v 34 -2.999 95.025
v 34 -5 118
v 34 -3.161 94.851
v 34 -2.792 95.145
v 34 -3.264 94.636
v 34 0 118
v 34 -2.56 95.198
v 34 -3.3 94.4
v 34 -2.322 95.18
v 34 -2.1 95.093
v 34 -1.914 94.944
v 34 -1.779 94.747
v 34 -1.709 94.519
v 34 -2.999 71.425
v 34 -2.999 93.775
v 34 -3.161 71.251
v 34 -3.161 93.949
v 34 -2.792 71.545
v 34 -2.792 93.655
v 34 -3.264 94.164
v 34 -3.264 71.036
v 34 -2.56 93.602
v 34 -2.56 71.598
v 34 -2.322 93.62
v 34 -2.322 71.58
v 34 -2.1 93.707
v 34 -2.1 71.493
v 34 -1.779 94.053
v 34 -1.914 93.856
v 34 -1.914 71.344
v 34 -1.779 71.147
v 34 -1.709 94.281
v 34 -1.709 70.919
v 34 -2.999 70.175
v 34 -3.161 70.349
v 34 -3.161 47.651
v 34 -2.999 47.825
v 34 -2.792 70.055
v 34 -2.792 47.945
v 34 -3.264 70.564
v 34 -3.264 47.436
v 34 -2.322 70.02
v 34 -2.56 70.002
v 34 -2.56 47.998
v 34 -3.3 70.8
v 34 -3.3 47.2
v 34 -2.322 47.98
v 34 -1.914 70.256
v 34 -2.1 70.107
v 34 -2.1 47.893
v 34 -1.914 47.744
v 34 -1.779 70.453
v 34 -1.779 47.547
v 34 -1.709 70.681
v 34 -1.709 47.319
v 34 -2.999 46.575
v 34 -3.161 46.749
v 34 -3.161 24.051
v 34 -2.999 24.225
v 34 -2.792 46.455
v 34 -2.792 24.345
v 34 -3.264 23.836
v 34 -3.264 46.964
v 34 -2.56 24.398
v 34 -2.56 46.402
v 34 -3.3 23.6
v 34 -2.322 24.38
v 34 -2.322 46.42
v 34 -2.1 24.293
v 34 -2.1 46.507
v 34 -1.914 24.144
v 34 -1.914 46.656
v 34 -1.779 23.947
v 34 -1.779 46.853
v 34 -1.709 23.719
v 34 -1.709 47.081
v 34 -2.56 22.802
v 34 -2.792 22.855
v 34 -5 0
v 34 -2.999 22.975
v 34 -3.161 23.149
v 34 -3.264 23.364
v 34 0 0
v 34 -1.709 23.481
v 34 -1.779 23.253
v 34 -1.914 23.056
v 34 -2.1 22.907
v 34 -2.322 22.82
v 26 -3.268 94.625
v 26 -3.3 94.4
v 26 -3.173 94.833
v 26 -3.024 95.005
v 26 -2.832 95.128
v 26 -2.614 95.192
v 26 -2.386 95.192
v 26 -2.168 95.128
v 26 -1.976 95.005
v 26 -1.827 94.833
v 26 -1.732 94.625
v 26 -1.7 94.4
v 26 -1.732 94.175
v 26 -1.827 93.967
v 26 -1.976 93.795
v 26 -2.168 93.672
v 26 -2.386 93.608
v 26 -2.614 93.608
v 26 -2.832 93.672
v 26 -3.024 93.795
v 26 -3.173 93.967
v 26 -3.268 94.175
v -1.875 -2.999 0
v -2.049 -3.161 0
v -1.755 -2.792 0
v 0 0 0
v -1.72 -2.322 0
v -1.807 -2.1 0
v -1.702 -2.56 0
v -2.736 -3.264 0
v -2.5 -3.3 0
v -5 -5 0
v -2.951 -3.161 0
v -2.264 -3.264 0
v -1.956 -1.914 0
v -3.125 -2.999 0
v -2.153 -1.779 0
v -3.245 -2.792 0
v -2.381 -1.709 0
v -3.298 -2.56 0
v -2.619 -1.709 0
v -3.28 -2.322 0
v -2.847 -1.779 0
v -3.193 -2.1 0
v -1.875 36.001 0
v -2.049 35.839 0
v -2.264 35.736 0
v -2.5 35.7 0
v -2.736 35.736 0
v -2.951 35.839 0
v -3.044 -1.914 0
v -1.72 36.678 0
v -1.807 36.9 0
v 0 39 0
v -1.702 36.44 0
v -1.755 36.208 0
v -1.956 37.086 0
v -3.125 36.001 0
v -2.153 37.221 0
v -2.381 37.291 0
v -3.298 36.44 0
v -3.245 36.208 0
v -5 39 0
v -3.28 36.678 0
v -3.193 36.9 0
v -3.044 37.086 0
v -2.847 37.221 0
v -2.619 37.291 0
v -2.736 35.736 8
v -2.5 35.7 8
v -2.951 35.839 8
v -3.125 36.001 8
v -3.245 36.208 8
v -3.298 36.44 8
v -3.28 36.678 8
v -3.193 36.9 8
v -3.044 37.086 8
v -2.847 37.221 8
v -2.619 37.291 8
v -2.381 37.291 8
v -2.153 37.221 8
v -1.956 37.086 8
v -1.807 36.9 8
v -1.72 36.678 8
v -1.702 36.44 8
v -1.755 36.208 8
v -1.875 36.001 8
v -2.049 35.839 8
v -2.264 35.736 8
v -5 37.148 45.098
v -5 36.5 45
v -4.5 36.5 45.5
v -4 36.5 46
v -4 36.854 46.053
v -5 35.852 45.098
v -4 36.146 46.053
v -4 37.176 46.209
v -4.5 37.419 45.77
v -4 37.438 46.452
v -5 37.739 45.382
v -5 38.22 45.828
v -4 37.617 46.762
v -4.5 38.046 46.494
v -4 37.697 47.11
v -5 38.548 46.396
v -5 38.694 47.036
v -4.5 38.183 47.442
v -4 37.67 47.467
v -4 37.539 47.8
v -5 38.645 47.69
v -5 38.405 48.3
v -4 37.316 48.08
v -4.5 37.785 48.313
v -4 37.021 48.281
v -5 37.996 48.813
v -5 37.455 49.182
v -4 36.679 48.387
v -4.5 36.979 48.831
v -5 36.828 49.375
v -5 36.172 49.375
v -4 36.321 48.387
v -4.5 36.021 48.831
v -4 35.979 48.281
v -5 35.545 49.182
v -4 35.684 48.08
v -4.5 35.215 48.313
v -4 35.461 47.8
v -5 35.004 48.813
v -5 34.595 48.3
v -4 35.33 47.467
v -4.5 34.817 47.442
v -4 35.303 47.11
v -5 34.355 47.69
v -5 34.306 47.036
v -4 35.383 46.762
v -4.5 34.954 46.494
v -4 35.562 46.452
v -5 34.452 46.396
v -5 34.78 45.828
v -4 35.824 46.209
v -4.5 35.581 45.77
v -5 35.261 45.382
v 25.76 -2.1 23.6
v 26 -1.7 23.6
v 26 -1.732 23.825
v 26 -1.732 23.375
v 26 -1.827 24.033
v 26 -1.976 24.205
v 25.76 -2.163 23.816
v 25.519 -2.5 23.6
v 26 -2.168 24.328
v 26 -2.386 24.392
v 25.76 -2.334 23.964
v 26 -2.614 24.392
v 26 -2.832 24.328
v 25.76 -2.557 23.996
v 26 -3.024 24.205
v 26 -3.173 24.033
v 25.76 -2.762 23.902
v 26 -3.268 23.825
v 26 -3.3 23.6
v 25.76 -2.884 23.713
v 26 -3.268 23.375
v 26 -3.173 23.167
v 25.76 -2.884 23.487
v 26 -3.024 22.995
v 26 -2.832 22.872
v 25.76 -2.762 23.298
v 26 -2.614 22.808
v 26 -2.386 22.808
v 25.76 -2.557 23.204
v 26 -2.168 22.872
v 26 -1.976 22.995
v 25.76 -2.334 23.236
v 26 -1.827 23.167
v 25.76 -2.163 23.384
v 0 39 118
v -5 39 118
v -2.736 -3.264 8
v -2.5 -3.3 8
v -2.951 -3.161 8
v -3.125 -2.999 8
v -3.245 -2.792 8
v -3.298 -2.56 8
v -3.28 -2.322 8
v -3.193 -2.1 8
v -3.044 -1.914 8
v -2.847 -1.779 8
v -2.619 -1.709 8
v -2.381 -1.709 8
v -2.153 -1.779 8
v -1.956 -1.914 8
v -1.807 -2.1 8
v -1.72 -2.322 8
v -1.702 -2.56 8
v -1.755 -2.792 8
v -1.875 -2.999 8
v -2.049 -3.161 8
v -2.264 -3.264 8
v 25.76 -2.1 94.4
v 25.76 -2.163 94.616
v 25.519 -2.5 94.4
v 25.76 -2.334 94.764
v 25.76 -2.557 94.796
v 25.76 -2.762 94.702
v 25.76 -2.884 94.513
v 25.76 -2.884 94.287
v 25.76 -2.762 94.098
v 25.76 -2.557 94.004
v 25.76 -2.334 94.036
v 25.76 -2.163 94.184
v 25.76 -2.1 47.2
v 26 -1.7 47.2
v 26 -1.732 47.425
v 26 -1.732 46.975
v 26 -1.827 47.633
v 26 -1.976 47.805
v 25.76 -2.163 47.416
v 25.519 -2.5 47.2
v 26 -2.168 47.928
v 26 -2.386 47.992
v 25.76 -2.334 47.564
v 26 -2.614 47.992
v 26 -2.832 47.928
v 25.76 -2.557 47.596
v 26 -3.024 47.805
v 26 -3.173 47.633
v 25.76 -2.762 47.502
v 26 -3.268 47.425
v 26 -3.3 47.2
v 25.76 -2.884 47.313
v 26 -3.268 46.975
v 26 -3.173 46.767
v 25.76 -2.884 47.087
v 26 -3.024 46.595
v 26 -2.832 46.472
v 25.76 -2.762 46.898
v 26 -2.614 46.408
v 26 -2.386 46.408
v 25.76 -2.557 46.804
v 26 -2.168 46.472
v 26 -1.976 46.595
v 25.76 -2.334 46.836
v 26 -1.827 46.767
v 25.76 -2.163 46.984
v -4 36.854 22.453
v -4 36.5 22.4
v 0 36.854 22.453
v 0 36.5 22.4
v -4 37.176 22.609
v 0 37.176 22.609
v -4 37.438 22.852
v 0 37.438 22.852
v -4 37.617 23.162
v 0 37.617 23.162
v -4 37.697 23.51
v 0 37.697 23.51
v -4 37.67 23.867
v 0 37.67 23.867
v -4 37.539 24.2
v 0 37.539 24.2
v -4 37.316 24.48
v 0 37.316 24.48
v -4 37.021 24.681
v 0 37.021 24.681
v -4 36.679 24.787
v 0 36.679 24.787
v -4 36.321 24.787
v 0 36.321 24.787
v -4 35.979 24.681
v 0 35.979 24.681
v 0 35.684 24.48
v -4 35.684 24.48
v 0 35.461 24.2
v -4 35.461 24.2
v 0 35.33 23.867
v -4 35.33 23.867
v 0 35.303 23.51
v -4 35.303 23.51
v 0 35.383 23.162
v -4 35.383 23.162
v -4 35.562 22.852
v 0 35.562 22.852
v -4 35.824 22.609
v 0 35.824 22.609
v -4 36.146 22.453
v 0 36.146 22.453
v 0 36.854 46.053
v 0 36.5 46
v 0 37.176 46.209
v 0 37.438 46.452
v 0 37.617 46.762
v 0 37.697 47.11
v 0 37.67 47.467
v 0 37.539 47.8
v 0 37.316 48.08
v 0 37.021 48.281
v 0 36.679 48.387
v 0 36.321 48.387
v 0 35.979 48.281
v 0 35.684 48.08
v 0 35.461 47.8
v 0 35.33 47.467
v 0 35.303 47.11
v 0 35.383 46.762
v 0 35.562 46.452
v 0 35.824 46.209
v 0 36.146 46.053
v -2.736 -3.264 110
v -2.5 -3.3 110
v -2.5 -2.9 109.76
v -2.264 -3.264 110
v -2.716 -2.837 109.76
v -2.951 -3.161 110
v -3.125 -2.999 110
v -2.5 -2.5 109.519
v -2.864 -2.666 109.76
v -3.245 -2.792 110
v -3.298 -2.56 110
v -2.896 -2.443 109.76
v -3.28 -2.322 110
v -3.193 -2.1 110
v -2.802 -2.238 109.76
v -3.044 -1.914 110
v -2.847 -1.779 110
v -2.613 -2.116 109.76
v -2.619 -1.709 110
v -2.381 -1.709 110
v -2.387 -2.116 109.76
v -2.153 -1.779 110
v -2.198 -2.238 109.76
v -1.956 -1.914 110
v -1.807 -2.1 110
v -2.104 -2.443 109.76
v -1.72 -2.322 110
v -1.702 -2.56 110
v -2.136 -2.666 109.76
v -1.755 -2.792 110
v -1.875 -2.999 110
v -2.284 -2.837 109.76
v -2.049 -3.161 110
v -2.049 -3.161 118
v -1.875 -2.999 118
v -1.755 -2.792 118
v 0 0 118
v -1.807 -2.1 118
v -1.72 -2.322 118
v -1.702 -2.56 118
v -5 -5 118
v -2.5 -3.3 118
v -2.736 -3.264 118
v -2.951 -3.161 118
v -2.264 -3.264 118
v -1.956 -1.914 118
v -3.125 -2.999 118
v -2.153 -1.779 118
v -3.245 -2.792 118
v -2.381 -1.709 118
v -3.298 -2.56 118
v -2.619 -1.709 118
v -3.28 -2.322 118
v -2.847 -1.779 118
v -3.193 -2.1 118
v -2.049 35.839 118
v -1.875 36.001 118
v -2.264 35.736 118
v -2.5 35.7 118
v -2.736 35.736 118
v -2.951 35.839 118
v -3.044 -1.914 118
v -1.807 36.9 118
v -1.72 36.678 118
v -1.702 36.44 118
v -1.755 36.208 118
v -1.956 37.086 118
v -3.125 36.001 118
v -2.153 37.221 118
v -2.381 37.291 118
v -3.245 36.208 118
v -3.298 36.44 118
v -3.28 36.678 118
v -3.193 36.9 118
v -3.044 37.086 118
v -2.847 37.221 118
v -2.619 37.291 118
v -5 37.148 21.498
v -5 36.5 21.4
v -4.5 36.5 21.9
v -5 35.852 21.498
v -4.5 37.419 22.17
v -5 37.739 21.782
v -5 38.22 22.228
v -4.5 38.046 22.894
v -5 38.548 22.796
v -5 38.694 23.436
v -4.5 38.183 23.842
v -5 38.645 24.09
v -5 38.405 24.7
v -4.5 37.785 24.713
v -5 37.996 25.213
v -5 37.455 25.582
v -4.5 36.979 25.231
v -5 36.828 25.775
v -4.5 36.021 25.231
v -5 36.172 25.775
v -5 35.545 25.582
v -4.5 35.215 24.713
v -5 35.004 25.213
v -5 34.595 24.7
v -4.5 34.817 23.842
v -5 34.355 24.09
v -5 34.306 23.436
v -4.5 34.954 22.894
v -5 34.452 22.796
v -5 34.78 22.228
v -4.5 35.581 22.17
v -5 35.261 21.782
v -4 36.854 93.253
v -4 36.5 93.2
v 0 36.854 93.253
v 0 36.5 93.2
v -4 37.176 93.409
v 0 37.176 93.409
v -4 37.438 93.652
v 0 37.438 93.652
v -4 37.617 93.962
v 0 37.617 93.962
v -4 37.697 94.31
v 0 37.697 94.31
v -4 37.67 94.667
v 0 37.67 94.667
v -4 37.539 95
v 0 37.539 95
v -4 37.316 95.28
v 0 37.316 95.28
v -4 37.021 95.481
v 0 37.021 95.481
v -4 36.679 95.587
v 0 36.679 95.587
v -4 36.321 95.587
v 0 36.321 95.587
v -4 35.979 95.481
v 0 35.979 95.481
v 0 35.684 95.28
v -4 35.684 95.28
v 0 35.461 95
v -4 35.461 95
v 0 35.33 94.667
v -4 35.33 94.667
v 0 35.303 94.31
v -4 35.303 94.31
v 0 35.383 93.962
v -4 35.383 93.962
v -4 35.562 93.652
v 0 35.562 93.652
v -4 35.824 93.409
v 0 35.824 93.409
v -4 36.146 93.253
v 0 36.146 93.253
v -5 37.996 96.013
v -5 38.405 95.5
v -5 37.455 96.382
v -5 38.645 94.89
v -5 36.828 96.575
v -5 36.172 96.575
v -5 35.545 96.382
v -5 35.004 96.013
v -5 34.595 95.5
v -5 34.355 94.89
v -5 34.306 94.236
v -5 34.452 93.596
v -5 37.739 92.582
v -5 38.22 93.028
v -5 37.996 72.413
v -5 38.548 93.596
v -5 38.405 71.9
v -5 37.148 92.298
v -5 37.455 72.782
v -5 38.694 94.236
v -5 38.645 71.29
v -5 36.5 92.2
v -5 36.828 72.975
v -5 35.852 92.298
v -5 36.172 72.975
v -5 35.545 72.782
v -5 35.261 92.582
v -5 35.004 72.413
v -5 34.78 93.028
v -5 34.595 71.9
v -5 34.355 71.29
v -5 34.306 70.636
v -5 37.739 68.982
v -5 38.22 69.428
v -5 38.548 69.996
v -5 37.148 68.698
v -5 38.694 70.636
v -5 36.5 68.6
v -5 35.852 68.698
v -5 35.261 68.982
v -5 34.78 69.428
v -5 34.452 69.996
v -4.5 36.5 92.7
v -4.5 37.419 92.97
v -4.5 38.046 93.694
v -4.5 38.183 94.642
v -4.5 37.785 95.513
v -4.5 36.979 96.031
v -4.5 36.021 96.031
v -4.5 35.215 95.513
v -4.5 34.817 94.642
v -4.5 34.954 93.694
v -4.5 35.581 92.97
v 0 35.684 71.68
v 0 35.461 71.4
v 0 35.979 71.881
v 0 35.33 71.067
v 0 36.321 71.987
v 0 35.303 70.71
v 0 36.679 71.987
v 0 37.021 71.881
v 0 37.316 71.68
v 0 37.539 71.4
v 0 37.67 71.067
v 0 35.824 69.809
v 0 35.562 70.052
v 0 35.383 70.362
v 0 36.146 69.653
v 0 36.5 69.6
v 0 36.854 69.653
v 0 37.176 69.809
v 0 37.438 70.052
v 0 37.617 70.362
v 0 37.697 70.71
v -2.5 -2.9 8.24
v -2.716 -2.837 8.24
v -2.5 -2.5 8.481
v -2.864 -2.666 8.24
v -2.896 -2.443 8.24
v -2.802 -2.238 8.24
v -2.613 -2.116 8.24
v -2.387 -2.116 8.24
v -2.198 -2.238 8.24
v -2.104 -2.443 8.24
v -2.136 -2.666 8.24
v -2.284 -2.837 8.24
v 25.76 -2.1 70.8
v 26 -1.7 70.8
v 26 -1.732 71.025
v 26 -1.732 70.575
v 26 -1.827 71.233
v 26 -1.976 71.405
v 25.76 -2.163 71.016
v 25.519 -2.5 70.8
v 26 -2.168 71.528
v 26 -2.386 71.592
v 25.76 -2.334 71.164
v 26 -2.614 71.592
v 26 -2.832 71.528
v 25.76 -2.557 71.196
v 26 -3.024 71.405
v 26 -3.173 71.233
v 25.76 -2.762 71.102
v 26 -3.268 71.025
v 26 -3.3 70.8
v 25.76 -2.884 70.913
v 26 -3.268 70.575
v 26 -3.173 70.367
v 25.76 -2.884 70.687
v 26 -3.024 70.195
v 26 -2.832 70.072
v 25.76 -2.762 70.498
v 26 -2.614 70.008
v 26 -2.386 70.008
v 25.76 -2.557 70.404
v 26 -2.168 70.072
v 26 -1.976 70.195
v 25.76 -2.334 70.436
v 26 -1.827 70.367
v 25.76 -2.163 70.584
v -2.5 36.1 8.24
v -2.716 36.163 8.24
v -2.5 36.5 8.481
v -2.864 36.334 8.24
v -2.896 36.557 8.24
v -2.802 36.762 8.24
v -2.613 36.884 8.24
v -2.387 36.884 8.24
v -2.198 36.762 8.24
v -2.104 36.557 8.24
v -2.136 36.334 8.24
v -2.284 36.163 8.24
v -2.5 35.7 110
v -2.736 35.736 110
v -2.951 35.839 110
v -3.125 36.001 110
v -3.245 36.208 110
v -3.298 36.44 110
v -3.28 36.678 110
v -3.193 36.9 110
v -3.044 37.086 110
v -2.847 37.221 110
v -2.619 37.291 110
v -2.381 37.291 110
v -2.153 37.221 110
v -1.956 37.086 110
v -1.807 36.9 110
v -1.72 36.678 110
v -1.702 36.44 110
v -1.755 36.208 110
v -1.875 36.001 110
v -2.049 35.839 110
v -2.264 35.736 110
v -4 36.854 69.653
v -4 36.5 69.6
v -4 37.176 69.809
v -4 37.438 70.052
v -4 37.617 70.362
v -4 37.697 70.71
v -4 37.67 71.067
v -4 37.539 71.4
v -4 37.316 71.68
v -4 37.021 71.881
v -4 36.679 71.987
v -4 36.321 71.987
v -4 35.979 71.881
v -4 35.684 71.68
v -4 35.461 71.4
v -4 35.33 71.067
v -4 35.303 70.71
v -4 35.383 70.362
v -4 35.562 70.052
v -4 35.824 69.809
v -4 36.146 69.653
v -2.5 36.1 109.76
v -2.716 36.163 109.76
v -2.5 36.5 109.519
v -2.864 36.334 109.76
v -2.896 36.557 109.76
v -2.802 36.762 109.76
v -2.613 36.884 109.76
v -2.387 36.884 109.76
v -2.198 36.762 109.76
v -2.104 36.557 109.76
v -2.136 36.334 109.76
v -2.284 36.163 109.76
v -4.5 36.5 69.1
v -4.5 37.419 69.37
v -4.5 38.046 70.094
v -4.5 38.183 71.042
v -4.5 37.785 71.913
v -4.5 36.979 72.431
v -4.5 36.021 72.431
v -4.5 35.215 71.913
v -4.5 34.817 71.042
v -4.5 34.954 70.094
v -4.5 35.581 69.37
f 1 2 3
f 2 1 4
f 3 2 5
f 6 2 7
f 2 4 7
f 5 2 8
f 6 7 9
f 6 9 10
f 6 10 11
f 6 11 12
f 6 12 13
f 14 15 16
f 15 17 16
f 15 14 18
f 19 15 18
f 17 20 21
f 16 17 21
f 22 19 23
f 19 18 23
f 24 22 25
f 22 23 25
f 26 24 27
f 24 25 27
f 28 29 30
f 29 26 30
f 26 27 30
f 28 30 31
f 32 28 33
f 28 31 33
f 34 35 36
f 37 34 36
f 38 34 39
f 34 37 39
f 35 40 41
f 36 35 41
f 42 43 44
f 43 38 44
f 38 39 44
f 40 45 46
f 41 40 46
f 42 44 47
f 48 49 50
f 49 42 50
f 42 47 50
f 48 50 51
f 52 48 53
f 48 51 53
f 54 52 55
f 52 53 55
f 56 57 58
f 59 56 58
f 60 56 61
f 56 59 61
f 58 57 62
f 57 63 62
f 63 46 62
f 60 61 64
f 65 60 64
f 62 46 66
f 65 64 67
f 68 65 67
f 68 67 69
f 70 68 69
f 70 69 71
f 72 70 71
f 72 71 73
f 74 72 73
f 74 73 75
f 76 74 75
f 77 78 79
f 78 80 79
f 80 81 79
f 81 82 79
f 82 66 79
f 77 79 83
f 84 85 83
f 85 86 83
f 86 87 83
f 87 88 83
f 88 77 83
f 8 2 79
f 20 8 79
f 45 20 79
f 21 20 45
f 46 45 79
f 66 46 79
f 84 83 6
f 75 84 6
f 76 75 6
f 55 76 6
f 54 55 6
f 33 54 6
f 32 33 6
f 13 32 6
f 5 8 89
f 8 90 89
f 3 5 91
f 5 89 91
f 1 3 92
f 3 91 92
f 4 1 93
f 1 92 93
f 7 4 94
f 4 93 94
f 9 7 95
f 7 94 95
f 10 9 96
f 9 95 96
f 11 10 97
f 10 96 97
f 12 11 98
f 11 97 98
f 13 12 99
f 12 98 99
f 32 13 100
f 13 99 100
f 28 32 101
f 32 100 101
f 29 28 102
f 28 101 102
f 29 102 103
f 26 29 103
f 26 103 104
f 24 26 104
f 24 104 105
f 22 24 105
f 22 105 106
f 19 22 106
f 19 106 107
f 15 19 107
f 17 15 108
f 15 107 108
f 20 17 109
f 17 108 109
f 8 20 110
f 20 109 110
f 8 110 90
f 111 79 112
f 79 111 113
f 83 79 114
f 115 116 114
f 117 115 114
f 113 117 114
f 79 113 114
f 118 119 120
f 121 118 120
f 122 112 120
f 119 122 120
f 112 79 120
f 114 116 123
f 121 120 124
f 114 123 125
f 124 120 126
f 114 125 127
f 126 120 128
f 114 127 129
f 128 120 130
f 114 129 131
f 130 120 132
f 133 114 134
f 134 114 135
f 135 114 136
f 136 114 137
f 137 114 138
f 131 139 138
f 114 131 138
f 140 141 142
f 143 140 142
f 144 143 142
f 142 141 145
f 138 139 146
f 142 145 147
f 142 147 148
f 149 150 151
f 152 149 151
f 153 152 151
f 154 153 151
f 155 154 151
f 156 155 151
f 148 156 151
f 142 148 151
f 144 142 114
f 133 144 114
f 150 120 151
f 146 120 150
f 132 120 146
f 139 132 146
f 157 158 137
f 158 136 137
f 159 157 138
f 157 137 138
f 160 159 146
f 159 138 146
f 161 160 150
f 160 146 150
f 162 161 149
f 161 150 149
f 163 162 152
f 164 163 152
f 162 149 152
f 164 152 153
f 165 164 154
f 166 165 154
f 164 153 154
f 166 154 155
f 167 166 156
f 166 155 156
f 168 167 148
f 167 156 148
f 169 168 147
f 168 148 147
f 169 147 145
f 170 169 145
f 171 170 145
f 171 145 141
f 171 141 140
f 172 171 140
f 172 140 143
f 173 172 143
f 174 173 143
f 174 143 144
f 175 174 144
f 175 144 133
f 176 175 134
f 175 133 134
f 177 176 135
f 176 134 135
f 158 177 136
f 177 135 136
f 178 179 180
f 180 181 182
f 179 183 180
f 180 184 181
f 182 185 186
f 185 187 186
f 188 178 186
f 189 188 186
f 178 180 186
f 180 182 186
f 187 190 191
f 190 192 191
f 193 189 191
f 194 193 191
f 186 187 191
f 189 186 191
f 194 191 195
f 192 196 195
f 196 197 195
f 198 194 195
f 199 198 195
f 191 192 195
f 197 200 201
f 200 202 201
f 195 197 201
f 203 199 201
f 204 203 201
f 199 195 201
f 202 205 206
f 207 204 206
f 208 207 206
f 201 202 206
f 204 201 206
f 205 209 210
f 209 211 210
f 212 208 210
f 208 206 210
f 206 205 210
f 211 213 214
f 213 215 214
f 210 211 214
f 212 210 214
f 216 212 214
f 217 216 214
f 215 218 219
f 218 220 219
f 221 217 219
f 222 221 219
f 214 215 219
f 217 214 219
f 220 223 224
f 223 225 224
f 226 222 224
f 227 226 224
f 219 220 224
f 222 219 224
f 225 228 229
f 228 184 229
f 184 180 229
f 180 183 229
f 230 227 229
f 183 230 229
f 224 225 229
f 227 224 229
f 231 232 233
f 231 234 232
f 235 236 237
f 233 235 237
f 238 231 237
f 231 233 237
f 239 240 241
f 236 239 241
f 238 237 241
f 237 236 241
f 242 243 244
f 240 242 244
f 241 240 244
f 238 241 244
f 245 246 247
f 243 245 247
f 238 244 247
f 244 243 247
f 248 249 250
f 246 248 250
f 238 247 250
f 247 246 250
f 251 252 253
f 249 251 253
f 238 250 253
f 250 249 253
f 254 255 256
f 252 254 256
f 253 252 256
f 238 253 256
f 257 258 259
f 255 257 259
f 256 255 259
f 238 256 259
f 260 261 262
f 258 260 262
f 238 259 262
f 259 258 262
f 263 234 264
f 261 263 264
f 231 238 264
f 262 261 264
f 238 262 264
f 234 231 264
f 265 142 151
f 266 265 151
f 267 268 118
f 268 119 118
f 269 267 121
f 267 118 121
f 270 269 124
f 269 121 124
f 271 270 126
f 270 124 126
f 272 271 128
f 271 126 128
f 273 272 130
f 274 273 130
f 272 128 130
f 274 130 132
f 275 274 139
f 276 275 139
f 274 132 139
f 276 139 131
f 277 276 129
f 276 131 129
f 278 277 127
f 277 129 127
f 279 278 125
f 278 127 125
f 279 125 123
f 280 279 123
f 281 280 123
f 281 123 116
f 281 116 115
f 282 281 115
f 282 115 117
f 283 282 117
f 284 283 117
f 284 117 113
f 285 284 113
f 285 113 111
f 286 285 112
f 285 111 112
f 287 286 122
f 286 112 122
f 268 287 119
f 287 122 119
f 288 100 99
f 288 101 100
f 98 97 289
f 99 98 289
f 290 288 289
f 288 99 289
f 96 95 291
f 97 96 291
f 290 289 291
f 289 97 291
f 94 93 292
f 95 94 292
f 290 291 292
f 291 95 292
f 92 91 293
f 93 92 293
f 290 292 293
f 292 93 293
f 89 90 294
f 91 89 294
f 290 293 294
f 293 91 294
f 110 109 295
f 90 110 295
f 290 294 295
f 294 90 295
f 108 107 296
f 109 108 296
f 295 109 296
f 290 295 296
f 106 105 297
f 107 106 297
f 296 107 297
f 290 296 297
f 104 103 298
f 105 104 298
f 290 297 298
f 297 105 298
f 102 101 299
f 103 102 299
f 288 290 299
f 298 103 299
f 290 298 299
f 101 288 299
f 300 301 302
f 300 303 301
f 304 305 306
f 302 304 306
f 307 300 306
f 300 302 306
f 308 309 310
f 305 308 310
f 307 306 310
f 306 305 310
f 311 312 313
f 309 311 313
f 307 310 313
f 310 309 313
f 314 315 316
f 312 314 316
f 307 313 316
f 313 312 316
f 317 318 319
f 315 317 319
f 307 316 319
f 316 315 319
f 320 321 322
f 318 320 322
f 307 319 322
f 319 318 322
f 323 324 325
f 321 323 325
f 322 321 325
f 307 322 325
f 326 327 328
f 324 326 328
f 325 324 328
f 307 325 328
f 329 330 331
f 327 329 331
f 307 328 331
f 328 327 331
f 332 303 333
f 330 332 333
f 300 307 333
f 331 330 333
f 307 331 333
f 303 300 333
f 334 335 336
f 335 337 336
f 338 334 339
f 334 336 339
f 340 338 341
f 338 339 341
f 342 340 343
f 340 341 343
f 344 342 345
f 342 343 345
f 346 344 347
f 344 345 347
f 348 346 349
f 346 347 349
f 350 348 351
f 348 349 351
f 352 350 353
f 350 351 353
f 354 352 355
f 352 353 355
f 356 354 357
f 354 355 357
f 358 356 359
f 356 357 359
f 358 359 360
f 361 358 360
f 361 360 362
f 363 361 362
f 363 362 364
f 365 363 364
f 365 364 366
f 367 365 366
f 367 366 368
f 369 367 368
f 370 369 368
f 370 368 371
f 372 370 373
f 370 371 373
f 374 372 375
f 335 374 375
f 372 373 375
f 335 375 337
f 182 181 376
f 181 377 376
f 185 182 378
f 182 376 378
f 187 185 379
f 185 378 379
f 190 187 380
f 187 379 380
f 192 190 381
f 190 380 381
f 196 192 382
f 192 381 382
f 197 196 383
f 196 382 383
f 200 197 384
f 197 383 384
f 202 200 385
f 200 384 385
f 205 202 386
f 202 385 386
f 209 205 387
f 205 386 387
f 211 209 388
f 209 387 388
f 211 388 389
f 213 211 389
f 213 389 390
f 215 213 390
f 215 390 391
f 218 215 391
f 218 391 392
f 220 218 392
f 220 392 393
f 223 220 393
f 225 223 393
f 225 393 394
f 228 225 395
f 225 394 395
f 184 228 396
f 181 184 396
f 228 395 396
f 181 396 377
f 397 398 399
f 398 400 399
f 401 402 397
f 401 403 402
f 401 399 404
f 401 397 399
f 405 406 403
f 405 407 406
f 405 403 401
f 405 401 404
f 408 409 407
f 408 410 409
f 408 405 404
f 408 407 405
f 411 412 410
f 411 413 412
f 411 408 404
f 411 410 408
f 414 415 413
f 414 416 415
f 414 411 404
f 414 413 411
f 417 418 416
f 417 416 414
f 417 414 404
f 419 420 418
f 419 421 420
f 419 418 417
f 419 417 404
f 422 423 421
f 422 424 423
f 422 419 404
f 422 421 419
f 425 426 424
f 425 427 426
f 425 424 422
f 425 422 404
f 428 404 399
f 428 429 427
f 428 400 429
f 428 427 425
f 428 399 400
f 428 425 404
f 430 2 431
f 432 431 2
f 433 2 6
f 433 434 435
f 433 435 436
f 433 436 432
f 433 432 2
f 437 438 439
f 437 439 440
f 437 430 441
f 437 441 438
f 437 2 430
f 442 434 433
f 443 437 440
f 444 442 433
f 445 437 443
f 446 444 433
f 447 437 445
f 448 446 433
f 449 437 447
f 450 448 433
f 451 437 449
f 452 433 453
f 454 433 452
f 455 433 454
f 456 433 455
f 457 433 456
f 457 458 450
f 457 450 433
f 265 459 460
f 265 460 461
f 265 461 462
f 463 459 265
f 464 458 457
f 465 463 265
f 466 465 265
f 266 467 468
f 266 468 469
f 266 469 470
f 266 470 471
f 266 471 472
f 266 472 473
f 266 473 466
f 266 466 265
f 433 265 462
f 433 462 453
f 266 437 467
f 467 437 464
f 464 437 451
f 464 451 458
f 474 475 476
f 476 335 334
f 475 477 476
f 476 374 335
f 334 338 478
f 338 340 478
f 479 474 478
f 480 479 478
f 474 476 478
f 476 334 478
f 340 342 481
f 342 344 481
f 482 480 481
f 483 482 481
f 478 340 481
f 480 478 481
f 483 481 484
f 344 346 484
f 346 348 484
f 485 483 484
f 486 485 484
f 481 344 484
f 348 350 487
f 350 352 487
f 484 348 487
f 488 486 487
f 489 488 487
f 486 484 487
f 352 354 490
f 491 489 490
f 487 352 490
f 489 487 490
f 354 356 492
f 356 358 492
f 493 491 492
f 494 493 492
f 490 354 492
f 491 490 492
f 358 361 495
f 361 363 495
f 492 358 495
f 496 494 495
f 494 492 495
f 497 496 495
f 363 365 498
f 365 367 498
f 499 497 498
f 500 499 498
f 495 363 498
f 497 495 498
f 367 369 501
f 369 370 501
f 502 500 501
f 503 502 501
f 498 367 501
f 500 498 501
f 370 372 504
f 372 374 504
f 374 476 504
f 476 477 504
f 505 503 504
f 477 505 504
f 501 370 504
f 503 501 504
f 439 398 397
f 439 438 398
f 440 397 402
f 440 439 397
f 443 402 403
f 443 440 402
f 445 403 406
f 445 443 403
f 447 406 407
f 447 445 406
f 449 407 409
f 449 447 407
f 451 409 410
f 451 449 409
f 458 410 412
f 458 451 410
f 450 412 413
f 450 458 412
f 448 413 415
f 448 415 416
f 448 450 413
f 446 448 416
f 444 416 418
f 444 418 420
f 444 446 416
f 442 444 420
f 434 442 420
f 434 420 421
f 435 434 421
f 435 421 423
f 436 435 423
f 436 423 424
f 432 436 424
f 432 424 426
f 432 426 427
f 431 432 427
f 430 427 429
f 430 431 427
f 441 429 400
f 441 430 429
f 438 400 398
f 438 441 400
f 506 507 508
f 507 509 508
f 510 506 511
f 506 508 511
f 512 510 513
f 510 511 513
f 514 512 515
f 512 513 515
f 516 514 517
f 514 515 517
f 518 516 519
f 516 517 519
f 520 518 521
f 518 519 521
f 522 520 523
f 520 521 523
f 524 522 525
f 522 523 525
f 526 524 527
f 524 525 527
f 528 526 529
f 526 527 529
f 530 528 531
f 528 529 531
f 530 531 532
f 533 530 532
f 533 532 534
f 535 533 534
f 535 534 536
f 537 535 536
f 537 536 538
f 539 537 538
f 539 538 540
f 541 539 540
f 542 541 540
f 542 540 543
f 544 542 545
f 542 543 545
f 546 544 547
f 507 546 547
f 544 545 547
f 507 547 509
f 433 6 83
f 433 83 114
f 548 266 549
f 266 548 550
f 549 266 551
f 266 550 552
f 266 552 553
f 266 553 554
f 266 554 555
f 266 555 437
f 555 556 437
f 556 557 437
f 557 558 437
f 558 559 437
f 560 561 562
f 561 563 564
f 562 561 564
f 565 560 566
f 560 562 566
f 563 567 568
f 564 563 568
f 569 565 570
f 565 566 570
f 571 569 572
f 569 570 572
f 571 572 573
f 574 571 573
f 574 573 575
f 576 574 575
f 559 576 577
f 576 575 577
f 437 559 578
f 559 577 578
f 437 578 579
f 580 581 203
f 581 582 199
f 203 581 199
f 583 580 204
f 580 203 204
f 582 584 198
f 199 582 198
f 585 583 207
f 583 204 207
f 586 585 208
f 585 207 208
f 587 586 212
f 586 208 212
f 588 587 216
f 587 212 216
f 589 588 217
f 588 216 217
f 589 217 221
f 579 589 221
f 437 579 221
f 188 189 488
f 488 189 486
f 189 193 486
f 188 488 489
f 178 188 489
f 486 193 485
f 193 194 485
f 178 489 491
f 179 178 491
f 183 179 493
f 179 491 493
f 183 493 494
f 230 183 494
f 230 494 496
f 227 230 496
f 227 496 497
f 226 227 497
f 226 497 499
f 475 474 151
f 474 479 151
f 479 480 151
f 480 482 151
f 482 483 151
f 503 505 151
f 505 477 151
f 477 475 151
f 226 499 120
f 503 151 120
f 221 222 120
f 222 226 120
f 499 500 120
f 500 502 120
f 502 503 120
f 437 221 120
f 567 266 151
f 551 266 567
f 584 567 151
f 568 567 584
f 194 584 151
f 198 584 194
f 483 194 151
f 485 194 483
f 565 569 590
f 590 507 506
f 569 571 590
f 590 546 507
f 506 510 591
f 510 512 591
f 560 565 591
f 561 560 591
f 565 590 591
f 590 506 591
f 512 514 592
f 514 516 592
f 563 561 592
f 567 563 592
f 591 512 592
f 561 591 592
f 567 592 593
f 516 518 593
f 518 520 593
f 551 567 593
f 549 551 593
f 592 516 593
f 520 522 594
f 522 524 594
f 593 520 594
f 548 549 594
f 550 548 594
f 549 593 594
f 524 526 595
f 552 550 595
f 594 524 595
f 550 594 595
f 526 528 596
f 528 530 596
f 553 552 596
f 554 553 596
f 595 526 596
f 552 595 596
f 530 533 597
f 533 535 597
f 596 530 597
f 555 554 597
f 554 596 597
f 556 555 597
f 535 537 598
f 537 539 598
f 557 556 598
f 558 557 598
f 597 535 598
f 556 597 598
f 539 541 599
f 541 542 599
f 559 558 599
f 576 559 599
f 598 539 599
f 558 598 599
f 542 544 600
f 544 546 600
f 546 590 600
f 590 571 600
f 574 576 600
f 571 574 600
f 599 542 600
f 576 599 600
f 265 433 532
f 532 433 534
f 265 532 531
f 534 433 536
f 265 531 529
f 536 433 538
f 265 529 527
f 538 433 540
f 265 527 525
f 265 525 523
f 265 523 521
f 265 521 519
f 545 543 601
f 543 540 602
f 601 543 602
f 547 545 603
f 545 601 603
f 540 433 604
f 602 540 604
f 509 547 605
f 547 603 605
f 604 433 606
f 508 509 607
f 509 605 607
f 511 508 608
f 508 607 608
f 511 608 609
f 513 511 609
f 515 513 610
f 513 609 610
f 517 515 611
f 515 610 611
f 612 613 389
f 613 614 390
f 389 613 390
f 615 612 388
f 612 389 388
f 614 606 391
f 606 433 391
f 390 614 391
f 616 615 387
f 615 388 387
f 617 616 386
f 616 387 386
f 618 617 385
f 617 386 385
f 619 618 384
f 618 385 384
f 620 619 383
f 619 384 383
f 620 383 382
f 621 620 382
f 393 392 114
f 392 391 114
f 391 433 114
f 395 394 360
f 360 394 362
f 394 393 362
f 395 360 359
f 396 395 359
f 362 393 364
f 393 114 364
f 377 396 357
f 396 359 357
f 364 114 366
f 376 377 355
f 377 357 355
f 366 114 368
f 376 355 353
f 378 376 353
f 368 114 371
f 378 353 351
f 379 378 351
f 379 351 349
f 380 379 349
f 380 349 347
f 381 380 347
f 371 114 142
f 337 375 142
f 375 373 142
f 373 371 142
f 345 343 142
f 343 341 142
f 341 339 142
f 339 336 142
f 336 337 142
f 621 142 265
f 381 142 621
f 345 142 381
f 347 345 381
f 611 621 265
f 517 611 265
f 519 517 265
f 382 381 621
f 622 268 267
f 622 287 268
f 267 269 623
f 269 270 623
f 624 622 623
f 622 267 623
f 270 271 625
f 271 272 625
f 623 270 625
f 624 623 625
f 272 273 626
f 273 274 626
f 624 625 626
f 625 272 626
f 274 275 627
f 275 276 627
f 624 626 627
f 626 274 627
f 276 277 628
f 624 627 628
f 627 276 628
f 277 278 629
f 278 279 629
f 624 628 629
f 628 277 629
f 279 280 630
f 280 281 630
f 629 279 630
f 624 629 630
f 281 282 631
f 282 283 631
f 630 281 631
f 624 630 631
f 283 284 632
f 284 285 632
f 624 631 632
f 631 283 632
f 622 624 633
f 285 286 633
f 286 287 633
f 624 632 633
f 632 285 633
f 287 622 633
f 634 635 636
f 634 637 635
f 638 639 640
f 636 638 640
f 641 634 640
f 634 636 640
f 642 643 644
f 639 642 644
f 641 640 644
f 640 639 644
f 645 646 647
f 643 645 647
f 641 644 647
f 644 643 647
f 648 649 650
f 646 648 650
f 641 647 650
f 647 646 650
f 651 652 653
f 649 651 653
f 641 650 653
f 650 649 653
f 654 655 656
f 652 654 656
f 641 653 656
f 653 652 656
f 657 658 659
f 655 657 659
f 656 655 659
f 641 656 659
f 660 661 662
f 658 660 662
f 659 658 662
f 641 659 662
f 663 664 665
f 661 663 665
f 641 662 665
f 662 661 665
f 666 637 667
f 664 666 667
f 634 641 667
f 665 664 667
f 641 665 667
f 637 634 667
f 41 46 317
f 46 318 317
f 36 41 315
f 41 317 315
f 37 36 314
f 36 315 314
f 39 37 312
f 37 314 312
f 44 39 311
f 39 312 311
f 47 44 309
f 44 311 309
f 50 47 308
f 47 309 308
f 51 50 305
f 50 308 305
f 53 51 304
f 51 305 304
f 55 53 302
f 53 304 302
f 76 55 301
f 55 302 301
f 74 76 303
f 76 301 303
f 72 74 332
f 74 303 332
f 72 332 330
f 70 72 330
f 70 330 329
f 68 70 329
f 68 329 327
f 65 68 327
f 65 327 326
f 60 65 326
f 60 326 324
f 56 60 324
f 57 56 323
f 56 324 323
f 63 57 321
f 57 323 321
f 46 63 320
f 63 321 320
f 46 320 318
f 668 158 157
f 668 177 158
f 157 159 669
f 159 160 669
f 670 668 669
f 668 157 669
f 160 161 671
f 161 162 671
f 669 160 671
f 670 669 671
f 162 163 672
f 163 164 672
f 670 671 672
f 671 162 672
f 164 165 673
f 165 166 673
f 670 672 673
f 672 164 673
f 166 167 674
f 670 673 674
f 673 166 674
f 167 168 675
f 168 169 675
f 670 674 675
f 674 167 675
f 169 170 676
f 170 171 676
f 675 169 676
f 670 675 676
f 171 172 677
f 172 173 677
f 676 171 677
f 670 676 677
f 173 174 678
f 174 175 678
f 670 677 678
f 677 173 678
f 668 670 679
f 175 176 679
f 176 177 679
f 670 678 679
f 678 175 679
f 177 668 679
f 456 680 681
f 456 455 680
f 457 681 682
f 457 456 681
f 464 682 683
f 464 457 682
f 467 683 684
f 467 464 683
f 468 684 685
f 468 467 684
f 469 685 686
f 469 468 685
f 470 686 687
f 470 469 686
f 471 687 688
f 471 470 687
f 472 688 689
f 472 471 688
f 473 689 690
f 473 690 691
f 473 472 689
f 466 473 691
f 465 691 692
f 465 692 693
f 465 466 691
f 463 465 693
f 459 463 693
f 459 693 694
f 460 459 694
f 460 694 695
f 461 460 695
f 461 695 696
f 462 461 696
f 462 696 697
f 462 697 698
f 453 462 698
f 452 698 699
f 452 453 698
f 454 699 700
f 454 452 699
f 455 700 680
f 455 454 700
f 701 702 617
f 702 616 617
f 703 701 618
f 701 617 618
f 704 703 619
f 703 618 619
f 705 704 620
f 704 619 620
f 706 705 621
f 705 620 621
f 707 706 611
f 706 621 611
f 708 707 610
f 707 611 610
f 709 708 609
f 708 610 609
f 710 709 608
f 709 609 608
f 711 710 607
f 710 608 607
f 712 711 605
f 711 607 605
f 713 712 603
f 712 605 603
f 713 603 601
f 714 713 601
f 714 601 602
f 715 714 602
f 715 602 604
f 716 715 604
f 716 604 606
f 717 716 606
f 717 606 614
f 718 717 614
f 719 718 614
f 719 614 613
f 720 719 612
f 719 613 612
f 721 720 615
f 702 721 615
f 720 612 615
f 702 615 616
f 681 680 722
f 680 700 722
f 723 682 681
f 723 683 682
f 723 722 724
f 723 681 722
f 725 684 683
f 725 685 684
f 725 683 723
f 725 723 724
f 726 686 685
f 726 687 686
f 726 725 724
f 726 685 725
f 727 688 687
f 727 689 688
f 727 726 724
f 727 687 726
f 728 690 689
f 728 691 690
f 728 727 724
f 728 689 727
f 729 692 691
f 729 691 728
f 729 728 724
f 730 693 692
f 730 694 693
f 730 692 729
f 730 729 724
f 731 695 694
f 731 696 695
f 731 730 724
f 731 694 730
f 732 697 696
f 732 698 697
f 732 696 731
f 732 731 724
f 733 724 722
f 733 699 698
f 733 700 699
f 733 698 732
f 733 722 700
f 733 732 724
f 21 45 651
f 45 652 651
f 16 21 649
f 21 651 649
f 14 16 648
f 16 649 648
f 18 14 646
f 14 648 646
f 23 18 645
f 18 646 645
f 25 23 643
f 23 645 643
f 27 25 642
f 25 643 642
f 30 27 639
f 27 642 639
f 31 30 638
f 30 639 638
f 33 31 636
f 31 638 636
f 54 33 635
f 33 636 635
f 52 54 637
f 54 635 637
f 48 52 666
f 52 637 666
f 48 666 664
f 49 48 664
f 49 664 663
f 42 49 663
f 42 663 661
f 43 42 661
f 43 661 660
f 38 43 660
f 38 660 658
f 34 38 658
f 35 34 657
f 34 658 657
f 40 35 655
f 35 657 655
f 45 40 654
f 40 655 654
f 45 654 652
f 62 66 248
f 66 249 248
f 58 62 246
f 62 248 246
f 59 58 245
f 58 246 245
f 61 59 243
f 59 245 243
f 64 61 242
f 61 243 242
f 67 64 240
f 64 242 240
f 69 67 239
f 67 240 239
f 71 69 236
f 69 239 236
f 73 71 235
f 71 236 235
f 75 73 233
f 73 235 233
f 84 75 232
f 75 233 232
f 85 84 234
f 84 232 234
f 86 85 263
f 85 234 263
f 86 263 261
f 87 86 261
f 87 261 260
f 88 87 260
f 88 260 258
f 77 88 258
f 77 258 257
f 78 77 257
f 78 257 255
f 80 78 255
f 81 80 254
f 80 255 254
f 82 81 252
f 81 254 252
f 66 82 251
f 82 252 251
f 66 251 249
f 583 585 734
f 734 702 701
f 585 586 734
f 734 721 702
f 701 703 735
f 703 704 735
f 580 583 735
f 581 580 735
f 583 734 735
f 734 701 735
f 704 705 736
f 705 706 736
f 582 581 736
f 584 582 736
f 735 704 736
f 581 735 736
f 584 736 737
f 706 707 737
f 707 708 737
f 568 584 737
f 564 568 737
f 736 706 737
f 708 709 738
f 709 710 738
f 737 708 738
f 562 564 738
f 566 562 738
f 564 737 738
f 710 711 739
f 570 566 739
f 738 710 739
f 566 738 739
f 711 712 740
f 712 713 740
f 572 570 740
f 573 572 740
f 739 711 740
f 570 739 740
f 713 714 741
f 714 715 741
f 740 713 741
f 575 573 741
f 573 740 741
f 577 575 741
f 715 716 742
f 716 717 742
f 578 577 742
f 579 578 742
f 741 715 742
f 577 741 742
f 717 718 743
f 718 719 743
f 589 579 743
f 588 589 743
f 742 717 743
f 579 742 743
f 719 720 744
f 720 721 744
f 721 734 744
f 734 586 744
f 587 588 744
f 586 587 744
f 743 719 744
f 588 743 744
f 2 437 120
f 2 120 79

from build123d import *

# Parameters (mm, degrees)
BOSS_EXTRUDE_EQUERRE_DEPTH                     = 118
FRAISAGE_POUR_VIS_T_TE_FRAIS_E_M20_D           = 2.4
FRAISAGE_POUR_VIS_T_TE_FRAIS_E_M20_DEPTH       = 5
FRAISAGE_POUR_VIS_T_TE_FRAIS_E_M20_CSINK_D     = 4.4
FRAISAGE_POUR_VIS_T_TE_FRAIS_E_M20_CSINK_ANGLE = 90
FRAISAGE_POUR_VIS_T_TE_FRAIS_E_M20_TIP         = 0.721032743
TROU_TARAUD_M2X0_43_D                          = 1.6
TROU_TARAUD_M2X0_43_DEPTH                      = 8
TROU_TARAUD_M2X0_43_TIP                        = 0.480688495
TROU_TARAUD_M2X0_44_AT_2_COUNT                 = 2
TROU_TARAUD_M2X0_44_AT_2_PITCH                 = 39


with BuildPart() as part:
    # Esquisse1 → Boss_Extrude_Equerre (new body)
    with BuildSketch(Plane(origin=(0, 0, 0), x_dir=(0, 1, 0), z_dir=(0, 0, 1))):
        Polygon((0, 0), (39, 0), (39, 5), (-5, 5), (-5, 0), (-5, -34), (0, -34), align=None)
    extrude(amount=BOSS_EXTRUDE_EQUERRE_DEPTH)

    # Fraisage pour vis à tête fraisée M20
    with Locations(Plane.ZY.offset(5)):
        with Locations((70.8, 36.5), (94.4, 36.5), (47.2, 36.5), (23.6, 36.5)):
            CounterSinkHole(FRAISAGE_POUR_VIS_T_TE_FRAIS_E_M20_D / 2, FRAISAGE_POUR_VIS_T_TE_FRAIS_E_M20_CSINK_D / 2, depth=FRAISAGE_POUR_VIS_T_TE_FRAIS_E_M20_DEPTH, counter_sink_angle=FRAISAGE_POUR_VIS_T_TE_FRAIS_E_M20_CSINK_ANGLE)
            with Locations((0, 0, -(FRAISAGE_POUR_VIS_T_TE_FRAIS_E_M20_DEPTH + FRAISAGE_POUR_VIS_T_TE_FRAIS_E_M20_TIP / 2))):  # 118° drill point
                Cone(0, FRAISAGE_POUR_VIS_T_TE_FRAIS_E_M20_D / 2, FRAISAGE_POUR_VIS_T_TE_FRAIS_E_M20_TIP, mode=Mode.SUBTRACT)

    # Trou taraudé M2x0.43
    with Locations(Plane.YZ.offset(34)):
        with Locations((-2.5, 70.8), (-2.5, 94.4), (-2.5, 47.2), (-2.5, 23.6)):
            Hole(TROU_TARAUD_M2X0_43_D / 2, depth=TROU_TARAUD_M2X0_43_DEPTH)
            with Locations((0, 0, -(TROU_TARAUD_M2X0_43_DEPTH + TROU_TARAUD_M2X0_43_TIP / 2))):  # 118° drill point
                Cone(0, TROU_TARAUD_M2X0_43_D / 2, TROU_TARAUD_M2X0_43_TIP, mode=Mode.SUBTRACT)

    # Esquisse11 → Trou taraudé M2x0.44 (revolve, cut)
    with BuildSketch(Plane(origin=(-2.5, 36.5, 118), x_dir=(0, -1, 0), z_dir=(1, 0, 0))):
        Polygon((0, 0), (0, 8.480688495), (0.8, 8), (0.8, 0), align=None)
    trou_taraud_m2x0_44 = revolve(axis=Axis((-2.5, 36.5, 124.35), (0, 0, -1)), mode=Mode.SUBTRACT)

    # Trou taraudé M2x0.44 at 2: Trou taraudé M2x0.44 ×2
    with Locations(*[(0, -i * TROU_TARAUD_M2X0_44_AT_2_PITCH, 0) for i in range(1, TROU_TARAUD_M2X0_44_AT_2_COUNT)]):
        add(trou_taraud_m2x0_44, mode=Mode.SUBTRACT)

    # Symétrie1: Trou taraudé M2x0.44 across plane
    add(trou_taraud_m2x0_44.mirror(Plane.XY.offset(59)), mode=Mode.SUBTRACT)

    # Symétrie1 copy 1 sketch → Symétrie1 copy 1 (revolve, cut)
    with BuildSketch(Plane(origin=(-2.5, -2.5, 0), x_dir=(0, -1, 0), z_dir=(1, 0, 0))):
        Polygon((0, 0), (0, -8.480688495), (0.8, -8), (0.8, 0), align=None)
    revolve(axis=Axis((-2.5, -2.5, -6.35), (0, 0, -1)), mode=Mode.SUBTRACT)


solid = part.part
